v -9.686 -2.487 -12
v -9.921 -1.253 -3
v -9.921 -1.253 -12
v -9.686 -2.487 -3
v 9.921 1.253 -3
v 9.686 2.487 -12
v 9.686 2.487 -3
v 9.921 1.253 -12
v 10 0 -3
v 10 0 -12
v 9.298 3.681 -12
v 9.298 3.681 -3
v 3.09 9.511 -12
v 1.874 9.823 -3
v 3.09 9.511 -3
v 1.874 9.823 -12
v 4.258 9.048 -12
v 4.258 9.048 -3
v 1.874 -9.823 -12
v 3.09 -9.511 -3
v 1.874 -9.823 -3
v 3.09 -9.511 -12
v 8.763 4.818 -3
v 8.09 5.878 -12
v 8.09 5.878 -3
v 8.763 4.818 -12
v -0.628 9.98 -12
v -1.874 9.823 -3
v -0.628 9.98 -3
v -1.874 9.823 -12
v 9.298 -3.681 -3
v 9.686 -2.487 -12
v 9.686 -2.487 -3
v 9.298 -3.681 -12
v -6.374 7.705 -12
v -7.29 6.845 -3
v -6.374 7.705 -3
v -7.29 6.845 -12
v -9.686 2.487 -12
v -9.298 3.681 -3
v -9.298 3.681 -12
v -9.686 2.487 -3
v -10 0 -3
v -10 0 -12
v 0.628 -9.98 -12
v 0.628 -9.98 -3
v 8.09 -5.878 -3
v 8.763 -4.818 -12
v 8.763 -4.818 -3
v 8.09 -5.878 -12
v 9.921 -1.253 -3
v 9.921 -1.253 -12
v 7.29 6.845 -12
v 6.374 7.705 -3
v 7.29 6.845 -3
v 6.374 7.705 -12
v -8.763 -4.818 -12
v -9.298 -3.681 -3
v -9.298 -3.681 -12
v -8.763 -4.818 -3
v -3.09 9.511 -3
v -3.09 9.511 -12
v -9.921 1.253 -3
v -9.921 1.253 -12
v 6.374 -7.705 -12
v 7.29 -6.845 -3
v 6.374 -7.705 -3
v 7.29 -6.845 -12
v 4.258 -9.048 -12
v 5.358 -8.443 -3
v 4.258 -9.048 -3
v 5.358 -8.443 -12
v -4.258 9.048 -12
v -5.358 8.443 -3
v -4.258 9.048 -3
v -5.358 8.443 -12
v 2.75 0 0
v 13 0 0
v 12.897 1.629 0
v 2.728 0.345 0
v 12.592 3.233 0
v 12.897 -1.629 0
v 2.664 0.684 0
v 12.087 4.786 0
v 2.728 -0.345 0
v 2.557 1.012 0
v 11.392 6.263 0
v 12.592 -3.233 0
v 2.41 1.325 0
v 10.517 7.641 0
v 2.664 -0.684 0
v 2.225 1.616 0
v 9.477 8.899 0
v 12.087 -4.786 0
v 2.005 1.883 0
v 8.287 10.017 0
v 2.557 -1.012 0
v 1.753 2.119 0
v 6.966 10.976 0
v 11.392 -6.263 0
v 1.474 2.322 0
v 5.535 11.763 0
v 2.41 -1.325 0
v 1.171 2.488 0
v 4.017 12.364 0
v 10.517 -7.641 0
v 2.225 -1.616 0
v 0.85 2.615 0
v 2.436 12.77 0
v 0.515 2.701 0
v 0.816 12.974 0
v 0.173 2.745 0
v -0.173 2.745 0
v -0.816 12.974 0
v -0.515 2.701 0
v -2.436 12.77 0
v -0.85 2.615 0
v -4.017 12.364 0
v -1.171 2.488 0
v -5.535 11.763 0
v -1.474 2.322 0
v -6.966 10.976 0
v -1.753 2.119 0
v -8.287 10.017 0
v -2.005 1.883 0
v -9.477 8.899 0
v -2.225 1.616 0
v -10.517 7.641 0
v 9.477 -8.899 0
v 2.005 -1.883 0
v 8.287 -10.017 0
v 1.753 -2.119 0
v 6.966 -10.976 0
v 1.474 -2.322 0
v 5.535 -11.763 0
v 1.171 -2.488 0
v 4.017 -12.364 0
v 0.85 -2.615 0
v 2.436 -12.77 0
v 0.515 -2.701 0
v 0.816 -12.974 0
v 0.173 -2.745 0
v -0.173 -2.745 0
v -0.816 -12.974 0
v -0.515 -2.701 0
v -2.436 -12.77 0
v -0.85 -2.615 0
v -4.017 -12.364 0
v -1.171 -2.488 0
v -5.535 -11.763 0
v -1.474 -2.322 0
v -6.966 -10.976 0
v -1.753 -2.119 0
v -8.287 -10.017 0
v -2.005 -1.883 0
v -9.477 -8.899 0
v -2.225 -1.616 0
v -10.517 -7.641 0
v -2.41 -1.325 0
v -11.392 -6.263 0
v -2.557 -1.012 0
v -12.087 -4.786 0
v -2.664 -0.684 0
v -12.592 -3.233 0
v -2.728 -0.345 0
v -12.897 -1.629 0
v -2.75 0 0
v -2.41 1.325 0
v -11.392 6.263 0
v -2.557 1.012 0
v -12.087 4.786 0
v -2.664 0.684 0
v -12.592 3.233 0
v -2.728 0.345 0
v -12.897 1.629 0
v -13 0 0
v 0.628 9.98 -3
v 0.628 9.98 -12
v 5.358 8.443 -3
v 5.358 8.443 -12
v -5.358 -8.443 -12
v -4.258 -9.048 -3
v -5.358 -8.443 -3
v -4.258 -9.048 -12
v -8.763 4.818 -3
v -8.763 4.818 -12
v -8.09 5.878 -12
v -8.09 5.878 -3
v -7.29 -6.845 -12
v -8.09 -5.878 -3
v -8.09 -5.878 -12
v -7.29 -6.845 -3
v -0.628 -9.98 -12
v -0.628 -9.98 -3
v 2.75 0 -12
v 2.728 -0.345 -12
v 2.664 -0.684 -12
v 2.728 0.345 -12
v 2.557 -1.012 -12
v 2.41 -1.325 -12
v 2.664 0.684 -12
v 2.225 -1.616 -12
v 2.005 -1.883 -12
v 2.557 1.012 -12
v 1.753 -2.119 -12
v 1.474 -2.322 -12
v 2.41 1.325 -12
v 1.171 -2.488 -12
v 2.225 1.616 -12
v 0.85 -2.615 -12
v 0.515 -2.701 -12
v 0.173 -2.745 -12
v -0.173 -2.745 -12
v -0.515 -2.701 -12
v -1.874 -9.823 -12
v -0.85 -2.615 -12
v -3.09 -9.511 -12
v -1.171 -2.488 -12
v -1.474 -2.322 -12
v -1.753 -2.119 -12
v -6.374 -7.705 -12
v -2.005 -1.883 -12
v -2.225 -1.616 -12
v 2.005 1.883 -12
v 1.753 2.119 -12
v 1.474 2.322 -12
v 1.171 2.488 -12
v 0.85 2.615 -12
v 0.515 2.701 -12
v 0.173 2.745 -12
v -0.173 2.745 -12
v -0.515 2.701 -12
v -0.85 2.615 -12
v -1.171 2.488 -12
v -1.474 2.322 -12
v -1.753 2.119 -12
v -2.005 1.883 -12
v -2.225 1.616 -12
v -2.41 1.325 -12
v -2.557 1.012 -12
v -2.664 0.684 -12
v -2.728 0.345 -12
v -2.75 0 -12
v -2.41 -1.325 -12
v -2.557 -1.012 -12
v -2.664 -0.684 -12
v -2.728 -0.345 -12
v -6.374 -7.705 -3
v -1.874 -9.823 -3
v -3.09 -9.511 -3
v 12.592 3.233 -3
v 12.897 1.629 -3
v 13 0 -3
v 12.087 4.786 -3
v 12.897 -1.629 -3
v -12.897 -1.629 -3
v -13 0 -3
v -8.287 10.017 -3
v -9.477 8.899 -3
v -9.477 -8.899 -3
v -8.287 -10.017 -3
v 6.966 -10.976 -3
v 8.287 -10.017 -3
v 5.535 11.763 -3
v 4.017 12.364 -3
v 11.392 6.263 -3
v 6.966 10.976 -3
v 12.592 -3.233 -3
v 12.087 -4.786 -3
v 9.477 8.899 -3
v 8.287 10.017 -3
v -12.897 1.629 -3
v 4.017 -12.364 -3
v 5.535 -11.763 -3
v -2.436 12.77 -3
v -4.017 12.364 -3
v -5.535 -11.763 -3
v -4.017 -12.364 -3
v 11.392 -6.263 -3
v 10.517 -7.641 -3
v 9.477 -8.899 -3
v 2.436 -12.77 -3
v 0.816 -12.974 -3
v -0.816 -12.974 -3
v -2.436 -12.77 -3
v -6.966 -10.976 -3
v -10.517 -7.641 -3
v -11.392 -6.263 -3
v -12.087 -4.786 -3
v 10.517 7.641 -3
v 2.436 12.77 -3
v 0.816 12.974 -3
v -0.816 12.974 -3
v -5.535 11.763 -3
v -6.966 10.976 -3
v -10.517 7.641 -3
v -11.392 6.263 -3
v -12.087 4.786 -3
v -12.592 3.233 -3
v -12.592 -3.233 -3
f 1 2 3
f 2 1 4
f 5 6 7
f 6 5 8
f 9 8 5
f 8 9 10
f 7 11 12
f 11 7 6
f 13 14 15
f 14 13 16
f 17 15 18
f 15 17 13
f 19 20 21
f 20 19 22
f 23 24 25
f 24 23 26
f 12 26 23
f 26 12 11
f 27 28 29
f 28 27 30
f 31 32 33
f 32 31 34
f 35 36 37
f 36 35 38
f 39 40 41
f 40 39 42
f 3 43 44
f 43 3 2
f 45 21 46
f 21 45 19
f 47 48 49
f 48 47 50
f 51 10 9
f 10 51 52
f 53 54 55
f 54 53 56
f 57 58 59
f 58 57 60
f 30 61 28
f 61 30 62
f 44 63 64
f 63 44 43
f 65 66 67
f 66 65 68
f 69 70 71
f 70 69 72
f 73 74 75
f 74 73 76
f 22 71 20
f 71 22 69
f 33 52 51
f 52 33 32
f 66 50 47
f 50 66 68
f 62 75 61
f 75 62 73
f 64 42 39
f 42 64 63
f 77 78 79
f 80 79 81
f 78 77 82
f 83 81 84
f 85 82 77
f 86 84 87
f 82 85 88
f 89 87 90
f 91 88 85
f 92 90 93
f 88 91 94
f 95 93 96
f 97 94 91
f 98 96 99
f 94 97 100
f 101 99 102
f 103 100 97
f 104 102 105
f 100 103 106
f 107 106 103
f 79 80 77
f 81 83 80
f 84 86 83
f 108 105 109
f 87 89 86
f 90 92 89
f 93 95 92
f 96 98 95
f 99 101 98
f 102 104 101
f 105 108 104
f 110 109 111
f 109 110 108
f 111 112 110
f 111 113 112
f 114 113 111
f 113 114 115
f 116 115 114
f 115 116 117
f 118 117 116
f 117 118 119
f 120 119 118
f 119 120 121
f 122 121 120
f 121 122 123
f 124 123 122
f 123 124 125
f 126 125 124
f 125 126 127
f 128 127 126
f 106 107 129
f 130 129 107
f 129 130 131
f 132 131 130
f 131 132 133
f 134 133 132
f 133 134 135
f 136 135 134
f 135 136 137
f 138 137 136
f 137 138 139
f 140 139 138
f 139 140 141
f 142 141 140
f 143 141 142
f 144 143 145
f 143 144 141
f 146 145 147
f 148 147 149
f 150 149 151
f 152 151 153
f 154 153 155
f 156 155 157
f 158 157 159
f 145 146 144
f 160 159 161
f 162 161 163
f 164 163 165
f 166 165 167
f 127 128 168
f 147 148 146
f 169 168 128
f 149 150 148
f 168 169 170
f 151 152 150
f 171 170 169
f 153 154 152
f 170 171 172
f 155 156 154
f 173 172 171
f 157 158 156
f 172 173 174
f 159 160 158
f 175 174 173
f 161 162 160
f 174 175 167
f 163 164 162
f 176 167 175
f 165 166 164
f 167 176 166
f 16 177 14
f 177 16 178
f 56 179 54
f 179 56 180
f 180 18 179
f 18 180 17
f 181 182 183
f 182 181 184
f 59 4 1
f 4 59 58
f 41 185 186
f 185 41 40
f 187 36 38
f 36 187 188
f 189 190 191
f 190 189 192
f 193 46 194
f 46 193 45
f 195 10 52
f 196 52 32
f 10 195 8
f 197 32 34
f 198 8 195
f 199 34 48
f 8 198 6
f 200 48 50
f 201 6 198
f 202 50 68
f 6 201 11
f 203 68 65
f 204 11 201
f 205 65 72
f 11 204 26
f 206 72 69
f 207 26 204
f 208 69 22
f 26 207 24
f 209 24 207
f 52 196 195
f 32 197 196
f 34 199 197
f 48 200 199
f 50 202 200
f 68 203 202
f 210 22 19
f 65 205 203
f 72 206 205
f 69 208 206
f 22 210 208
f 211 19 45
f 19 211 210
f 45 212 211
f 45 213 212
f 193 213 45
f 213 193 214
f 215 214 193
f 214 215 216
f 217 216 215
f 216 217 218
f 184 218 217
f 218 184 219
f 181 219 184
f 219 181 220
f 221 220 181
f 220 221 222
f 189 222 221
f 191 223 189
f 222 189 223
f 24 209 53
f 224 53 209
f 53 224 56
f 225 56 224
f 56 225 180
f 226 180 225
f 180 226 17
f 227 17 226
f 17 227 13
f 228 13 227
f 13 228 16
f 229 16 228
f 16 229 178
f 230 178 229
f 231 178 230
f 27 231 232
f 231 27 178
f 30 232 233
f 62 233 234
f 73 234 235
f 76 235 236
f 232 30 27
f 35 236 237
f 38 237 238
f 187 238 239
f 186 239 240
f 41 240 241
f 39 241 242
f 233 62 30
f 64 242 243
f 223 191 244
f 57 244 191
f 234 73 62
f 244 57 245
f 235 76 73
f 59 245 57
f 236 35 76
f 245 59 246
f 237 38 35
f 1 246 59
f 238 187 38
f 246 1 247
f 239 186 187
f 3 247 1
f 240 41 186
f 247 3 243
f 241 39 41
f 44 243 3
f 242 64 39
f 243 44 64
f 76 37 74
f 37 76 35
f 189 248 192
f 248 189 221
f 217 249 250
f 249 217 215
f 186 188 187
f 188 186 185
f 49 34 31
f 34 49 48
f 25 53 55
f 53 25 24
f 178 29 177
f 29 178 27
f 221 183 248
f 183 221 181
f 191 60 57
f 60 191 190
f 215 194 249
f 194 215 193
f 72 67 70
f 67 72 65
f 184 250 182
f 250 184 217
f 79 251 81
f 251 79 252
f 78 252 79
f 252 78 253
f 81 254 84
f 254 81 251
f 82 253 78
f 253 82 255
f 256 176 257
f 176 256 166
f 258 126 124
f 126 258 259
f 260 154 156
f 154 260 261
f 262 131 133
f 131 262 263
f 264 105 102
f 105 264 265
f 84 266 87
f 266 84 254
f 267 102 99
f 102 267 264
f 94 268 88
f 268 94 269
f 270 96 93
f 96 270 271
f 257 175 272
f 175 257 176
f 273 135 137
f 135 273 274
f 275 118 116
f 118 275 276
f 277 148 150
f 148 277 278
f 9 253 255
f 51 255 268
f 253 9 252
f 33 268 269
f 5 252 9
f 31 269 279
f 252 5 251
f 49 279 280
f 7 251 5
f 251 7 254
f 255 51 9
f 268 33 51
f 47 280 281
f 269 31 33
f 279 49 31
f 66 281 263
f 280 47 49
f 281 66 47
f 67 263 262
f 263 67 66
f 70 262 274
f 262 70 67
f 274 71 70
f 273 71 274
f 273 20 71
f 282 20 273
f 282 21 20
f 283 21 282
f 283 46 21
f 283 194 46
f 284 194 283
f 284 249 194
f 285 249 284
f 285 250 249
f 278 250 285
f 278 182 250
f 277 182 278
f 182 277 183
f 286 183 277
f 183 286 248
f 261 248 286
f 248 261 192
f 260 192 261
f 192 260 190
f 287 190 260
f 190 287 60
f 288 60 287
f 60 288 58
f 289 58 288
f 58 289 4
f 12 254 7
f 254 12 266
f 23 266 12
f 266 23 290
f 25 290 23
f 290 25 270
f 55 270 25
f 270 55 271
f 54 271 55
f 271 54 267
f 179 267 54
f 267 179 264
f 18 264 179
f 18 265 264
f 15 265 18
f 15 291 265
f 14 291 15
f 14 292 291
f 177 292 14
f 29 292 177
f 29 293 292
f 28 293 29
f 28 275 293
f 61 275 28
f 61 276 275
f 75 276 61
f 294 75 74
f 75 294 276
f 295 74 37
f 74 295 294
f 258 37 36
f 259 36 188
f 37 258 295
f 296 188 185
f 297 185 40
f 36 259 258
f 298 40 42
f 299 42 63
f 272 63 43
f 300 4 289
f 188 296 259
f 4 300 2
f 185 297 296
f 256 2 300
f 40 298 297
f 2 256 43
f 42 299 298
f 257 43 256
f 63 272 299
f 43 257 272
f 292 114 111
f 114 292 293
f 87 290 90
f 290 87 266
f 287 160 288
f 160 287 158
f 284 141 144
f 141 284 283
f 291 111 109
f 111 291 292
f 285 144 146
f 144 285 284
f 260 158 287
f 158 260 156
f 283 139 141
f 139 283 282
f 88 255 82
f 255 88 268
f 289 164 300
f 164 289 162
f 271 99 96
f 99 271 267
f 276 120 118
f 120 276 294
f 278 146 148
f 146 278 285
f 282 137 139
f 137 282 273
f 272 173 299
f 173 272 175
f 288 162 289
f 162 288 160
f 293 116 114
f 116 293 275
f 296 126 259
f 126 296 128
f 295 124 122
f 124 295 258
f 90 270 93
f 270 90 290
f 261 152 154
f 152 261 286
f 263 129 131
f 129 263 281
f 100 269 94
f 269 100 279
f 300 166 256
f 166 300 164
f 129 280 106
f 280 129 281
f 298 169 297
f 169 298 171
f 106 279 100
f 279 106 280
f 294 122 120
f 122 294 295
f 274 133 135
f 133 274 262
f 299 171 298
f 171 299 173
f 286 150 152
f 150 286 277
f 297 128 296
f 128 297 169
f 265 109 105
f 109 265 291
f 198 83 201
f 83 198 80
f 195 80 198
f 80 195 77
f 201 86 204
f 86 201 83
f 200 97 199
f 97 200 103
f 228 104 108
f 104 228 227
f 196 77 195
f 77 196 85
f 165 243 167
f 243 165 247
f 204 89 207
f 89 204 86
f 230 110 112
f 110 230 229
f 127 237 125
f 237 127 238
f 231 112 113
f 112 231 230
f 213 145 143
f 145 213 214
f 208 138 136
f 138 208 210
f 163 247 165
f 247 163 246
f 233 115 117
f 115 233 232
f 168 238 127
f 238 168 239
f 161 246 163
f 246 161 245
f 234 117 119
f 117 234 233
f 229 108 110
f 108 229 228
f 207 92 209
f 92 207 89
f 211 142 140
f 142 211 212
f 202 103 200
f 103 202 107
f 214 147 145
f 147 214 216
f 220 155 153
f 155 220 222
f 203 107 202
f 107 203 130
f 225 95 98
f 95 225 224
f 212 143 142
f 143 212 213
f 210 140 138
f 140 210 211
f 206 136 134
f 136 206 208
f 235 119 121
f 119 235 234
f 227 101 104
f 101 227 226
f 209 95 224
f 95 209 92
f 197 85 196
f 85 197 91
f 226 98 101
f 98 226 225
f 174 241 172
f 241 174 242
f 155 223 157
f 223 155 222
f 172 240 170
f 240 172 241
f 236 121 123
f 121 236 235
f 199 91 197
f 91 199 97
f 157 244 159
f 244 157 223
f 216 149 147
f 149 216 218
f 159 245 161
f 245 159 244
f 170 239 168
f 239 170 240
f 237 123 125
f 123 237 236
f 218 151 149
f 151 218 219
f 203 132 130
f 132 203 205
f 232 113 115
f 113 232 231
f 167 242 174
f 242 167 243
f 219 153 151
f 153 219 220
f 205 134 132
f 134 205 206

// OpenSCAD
$fn = 50;


difference() {
	union() {
		translate(v = [0, 0, -12.0000000000]) {
			cylinder(h = 12, r = 10.0000000000);
		}
		translate(v = [0, 0, -3.0000000000]) {
			cylinder(h = 3, r = 13.0000000000);
		}
	}
	union() {
		#translate(v = [0, 0, -12]) {
			cylinder(h = 12, r = 2.7500000000);
		}
	}
}
